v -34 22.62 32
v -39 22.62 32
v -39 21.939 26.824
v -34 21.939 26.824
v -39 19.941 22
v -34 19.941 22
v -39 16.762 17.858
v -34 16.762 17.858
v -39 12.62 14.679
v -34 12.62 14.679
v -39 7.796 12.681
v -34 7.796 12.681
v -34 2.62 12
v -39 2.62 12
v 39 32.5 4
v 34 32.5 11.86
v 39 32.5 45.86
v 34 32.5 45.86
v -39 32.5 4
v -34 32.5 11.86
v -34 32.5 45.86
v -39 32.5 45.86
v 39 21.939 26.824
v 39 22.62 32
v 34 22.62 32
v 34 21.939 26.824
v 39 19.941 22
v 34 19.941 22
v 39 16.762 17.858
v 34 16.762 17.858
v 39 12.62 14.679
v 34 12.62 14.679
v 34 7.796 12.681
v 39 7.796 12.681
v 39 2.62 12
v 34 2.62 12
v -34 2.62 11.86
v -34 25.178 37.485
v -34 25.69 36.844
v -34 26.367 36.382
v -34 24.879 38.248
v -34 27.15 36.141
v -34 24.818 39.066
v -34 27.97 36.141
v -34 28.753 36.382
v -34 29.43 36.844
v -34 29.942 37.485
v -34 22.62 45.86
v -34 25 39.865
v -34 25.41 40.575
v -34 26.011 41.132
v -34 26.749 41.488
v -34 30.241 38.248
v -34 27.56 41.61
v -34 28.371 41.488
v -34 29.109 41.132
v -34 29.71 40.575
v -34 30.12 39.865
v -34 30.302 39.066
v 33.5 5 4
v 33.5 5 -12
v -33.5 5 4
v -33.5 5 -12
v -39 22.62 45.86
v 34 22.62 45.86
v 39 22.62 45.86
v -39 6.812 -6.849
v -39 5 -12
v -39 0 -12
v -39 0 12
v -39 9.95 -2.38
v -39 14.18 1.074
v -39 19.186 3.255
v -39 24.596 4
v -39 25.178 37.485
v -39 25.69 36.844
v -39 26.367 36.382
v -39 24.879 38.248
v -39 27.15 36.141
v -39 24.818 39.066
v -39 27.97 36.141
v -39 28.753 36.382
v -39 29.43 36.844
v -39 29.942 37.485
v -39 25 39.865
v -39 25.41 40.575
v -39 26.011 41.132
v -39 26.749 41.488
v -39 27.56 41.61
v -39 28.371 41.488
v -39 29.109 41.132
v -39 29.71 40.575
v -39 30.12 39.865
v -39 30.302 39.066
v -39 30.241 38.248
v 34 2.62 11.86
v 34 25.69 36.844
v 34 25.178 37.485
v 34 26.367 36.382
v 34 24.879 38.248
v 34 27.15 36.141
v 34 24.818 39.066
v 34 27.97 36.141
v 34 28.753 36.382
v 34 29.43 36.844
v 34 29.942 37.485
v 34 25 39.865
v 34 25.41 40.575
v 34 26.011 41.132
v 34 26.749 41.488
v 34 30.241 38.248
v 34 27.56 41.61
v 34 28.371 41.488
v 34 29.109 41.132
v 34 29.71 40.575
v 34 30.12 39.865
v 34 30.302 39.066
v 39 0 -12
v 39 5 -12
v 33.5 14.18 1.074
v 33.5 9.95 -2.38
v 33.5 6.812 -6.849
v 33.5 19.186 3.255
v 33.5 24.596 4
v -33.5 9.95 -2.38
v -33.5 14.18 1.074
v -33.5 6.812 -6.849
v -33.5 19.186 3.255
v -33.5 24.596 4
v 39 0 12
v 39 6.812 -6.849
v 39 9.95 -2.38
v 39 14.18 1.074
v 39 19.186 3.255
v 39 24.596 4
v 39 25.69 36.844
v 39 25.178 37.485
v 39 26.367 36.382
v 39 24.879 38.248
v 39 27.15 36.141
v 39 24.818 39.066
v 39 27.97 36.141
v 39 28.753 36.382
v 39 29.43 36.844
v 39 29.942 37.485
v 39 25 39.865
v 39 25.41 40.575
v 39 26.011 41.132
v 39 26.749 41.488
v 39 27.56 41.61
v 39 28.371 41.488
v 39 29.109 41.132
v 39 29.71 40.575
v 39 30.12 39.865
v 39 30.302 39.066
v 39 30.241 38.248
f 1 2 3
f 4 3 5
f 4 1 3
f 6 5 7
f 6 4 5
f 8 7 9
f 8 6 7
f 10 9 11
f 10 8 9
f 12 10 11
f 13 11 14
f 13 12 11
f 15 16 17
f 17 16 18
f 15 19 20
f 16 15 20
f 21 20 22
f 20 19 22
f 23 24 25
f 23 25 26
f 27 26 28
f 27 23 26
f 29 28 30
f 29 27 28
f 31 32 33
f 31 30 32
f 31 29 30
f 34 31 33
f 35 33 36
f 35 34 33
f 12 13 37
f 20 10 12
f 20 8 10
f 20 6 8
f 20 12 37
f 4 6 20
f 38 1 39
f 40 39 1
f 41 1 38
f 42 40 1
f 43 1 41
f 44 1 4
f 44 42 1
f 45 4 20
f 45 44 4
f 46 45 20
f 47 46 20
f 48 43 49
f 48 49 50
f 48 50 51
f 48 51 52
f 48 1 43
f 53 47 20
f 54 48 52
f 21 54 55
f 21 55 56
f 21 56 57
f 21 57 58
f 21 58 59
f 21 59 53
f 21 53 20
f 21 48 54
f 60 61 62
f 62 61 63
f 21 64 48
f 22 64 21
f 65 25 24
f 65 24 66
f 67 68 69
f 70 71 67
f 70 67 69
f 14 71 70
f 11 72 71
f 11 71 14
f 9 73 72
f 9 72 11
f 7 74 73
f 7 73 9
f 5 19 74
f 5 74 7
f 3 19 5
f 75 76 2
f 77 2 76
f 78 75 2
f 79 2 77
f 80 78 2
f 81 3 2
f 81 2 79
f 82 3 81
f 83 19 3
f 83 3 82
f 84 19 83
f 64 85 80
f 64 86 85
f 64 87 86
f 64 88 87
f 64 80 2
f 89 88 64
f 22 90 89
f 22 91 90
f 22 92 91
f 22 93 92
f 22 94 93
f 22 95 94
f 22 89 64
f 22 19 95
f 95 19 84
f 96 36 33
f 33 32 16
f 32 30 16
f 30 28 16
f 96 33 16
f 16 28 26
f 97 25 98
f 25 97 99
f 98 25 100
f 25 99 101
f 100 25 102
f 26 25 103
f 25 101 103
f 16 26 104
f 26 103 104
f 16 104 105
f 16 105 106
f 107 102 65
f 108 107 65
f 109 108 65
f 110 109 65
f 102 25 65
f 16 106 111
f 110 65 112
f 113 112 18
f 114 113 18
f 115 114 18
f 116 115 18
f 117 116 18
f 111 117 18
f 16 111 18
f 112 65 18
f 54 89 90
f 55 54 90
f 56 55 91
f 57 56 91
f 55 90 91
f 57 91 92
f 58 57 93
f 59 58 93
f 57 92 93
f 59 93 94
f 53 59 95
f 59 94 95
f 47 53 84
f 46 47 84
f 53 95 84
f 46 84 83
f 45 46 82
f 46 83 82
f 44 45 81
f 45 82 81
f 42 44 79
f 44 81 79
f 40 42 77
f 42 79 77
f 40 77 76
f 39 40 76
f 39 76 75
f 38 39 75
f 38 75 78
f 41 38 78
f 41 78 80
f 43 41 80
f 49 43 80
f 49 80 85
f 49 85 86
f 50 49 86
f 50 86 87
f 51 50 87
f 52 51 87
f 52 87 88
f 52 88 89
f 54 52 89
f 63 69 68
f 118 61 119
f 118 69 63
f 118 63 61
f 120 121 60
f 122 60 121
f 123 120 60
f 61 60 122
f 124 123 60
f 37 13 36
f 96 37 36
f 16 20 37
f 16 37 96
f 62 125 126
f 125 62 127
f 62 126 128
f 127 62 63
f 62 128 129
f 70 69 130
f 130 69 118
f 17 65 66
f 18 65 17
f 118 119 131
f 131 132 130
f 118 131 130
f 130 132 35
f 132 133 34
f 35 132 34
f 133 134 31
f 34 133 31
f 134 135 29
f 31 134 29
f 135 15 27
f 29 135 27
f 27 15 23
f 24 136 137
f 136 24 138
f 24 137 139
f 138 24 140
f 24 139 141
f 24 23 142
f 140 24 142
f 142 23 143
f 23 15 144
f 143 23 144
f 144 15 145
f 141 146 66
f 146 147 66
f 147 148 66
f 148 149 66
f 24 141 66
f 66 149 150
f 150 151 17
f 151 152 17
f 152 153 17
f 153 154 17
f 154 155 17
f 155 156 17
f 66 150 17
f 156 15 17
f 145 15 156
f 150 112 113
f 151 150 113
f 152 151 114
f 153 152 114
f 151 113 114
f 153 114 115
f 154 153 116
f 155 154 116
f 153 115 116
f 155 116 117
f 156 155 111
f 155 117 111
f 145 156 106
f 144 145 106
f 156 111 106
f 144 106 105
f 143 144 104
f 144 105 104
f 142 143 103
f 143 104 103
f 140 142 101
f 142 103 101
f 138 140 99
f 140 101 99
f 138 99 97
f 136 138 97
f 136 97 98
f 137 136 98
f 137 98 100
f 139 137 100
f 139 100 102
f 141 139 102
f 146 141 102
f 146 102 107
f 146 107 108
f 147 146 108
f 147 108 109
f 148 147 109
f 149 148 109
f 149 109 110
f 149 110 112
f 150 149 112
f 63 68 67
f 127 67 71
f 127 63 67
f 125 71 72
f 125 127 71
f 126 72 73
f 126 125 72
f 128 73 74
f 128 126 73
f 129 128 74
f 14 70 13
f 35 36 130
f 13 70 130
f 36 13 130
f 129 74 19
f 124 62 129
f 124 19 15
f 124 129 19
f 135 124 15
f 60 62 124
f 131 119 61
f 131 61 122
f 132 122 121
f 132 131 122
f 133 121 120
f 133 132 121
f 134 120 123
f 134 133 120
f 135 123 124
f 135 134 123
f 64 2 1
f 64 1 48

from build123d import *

# Parameters (mm, degrees)
SKETCH1_W           = 78
SKETCH1_H           = 24
BOSS_EXTRUDE1_DEPTH = 5
SKETCH2_W           = 78
SKETCH2_H           = 8
BOSS_EXTRUDE2_DEPTH = 27.5
FILLET1_R           = 20
SKETCH3_W           = 67
SKETCH3_H           = 19.595917942
CUT_EXTRUDE1_DEPTH  = 16
SKETCH4_W           = 33.86
SKETCH4_H           = 9.88
SKETCH4_R           = 2.75
BOSS_EXTRUDE3_DEPTH = 78
FILLET2_R           = 20
SKETCH5_W           = 68
SKETCH5_H           = 20
CUT_EXTRUDE2_DEPTH  = 34
SKETCH6_W           = 68
SKETCH6_H           = 9.88
CUT_EXTRUDE3_DEPTH  = 34


with BuildPart() as part:
    # Sketch1 → Boss-Extrude1 (new body)
    with BuildSketch(Plane(origin=(0, 0, 0), x_dir=(1, 0, 0), z_dir=(0, 1, 0))):
        Rectangle(SKETCH1_W, SKETCH1_H)
    extrude(amount=BOSS_EXTRUDE1_DEPTH)

    # Sketch2 → Boss-Extrude2 (add)
    with BuildSketch(Plane(origin=(0, 5, 0), x_dir=(1, 0, 0), z_dir=(0, 1, 0))):
        with Locations((0, -8)):
            Rectangle(SKETCH2_W, SKETCH2_H)
    extrude(amount=BOSS_EXTRUDE2_DEPTH)

    # Fillet1
    # the kernel refuses this fillet: 20 mm, written as the material it adds along each edge
    with BuildSketch(Plane(origin=(39, 5, 4), x_dir=(0, 0, -1), z_dir=(-1, 0, 0))) as fillet1_piece_1:
        with BuildLine():
            CenterArc((20, -19.595917942), FILLET1_R, 101.536959033, 78.463040967)
            Line((0, -19.595917942), (-0.4, -19.595917942))
            Line((-0.4, -19.595917942), (-0.4, 0))
            Line((-0.4, 0), (0, 0.4))
            ThreePointArc((0, 0.4), (8, 0.4), (15.92, 0.391918359))
            Line((15.92, 0.391918359), (16, 0))
        make_face()
    extrude(amount=78)

    # Sketch3 → Cut-Extrude1 (cut)
    with BuildSketch(Plane(origin=(0, 0, -12), x_dir=(-1, 0, 0), z_dir=(0, 0, -1))):
        with Locations((0, 14.797958971)):
            Rectangle(SKETCH3_W, SKETCH3_H)
    extrude(amount=-CUT_EXTRUDE1_DEPTH, mode=Mode.SUBTRACT)

    # Sketch4 → Boss-Extrude3 (add)
    with BuildSketch(Plane.ZY.offset(39)):
        with Locations((28.93, 27.56)):
            Rectangle(SKETCH4_W, SKETCH4_H)
        with Locations((38.86, 27.56)):
            Circle(SKETCH4_R, mode=Mode.SUBTRACT)
    extrude(amount=-BOSS_EXTRUDE3_DEPTH)

    # Fillet2
    fillet2_edges = [part.edges().sort_by_distance(p)[0] for p in [
        (0, 22.62, 12),
    ]]
    fillet(fillet2_edges, radius=FILLET2_R)

    # Sketch5 → Cut-Extrude2 (cut)
    with BuildSketch(Plane.XY.offset(45.86)):
        with Locations((0, 12.62)):
            Rectangle(SKETCH5_W, SKETCH5_H)
    extrude(amount=-CUT_EXTRUDE2_DEPTH, mode=Mode.SUBTRACT)

    # Sketch6 → Cut-Extrude3 (cut)
    with BuildSketch(Plane.XY.offset(45.86)):
        with Locations((0, 27.56)):
            Rectangle(SKETCH6_W, SKETCH6_H)
    extrude(amount=-CUT_EXTRUDE3_DEPTH, mode=Mode.SUBTRACT)


solid = part.part
